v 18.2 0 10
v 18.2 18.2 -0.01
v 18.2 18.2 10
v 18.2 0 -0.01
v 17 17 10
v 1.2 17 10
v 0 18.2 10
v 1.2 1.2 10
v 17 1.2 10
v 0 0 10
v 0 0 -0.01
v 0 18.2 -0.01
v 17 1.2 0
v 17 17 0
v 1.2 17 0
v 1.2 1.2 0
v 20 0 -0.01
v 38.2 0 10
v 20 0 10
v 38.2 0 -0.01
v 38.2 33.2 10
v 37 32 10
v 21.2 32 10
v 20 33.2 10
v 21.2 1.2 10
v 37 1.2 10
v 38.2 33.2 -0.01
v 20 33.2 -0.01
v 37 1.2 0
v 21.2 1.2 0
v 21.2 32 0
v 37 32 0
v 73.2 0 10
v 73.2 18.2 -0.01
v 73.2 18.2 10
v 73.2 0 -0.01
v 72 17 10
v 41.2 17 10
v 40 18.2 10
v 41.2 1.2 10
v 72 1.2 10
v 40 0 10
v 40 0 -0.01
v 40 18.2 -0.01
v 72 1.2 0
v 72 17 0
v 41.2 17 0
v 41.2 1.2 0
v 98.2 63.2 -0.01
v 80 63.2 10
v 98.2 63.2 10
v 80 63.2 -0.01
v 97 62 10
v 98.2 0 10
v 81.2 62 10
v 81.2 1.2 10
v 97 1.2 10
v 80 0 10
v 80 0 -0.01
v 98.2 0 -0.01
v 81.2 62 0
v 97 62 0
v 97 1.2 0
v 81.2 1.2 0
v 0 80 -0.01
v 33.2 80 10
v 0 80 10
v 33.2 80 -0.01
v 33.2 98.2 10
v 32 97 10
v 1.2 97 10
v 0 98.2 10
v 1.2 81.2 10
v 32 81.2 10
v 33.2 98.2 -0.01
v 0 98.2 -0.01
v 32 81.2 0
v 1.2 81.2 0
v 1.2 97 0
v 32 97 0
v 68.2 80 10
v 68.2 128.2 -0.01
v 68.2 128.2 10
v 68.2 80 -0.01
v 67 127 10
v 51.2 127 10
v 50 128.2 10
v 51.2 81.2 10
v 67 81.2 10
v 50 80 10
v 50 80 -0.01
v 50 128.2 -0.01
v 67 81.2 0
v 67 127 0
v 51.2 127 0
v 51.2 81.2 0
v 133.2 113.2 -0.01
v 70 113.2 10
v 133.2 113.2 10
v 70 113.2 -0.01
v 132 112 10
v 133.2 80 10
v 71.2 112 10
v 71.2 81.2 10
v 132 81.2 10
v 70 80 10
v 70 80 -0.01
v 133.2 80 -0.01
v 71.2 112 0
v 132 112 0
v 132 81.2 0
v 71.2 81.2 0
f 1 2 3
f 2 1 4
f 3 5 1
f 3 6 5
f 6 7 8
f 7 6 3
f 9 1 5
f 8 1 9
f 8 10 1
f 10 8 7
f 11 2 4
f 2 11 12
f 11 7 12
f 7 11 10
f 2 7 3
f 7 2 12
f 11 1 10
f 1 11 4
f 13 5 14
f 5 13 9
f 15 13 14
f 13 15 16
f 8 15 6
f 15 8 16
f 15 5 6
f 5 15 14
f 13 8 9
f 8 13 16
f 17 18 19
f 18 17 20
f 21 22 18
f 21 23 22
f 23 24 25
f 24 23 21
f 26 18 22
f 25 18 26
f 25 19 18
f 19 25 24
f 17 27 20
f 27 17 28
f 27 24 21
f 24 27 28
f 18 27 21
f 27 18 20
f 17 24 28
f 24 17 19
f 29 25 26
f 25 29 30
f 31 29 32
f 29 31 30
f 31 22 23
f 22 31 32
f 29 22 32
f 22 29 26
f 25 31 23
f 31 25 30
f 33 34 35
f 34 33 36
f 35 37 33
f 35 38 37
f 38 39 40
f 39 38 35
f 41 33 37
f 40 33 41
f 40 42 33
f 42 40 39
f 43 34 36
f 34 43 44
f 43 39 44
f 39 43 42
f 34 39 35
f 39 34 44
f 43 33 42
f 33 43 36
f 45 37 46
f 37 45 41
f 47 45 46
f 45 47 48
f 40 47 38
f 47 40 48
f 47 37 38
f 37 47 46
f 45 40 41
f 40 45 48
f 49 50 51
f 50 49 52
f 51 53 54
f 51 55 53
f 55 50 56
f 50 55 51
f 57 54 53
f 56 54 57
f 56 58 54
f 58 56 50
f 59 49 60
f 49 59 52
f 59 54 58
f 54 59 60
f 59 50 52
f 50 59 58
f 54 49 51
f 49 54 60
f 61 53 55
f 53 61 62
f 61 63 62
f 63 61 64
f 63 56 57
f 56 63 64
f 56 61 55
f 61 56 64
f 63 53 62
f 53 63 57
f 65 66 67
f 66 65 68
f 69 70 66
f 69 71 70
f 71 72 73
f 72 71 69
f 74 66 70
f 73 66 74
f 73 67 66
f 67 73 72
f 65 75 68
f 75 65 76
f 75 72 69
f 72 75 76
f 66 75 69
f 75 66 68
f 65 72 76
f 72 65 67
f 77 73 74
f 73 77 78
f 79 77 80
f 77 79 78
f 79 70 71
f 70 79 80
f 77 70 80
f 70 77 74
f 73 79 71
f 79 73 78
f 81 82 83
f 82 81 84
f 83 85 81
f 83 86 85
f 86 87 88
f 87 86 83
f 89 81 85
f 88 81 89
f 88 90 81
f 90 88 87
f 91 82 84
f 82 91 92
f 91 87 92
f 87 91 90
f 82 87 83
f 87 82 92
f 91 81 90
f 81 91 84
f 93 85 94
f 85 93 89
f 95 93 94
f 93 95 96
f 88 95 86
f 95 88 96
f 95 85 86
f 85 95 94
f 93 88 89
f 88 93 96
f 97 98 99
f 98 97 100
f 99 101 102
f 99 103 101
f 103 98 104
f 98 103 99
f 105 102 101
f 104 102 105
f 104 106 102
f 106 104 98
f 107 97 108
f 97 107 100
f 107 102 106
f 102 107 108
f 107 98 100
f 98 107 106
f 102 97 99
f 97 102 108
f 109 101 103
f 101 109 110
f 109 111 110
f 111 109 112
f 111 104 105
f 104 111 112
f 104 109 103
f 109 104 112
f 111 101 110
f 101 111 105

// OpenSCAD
// file: ../../Base/Boxes.scad
// Fischertechnik Box Foundation
// Pre-designed Boxes

use <Constants.scad>

include <PlacementOptions.scad>

box190Width = 190;
box190Depth = 130;
box130Width = 130;
box130Depth = 95;
boxUsageHeight = 33.9;
boxWallThickness = 2.4;
boxBaseThickness = 1.0;

// getBoxWallThickness()
// Gets the wall thickness of a Fischertechnik Box

function getBoxWallThickness() = boxWallThickness;

// Gets the usable height of a fischertechnik box
function getBoxUsageHeight() = boxUsageHeight;

// Gets the thickness of the Fischertechnik box base.
function getBoxBaseThickness() = boxBaseThickness;

// Gets the usable inner space of a Box 190 as an x/y-list
function getBox190Space() = [
    box190Width - 2*getBoxWallThickness(), 
    box190Depth - 2*getBoxWallThickness() ];

// Imports the Fischertechnik empty box 130x190 mm and places it at position 0,0
// 190x130 are the outer sizes, the inner space is slightly smaller. Use getBox190Space() to get the inner sizes.
// This module needs the STL file "Fischertechnik Box 130x190.stl" in the library path.
// The box is positioned that the usable inner space is at the 0,0,0 position. The

module Box190() {
    translate([-getBoxWallThickness(),-getBoxWallThickness(),-getBoxBaseThickness()])
        import("Fischertechnik Box 130x190.stl", convexity=3);
}

// Gets the usable inner space of a Box 130 as an x/y-list
function getBox130Space() = [
    box130Width - 2*getBoxWallThickness(), 
    box130Depth - 2*getBoxWallThickness() ];

// Imports the Fischertechnik empty box 95x130 mm and places it at position 0,0
// 190x130 are the outer sizes, the inner space is slightly smaller. Use getBox190Space() to get the inner sizes.
// This module needs the STL file "Fischertechnik Box 95x130.stl" in the library path.
// The box is positioned that the usable inner space is at the 0,0,0 position. The

module Box130() {
    translate([-getBoxWallThickness(),-getBoxWallThickness(),-getBoxBaseThickness()])
        import("Fischertechnik Box 95x130.stl", convexity=3);
}

// Creates a web at the specified box walls
// corner 0 = LowerLeft, 1 = UpperLeft, 2 = UpperRight, 3 = LowerRight
// side 0 = LeftOfCorner, 1 = RightOfCorner
// distance = Distance in mm from the corner
// box = inner width and depth of the box (default: Box 190)
// webWidth = length of the web (default is 3 mms)
// webThickness = thickness of the web (default is 1 mm)

module BoxWeb(corner, side, distance, box=getBox190Space(), webWidth=3, webThickness=1.0) {
    sink = getBoxWallThickness()/2;

    width = (corner % 2 == 0) ? 
            (side == LeftOfCorner ? webWidth : webThickness) :
            (side == LeftOfCorner ? webThickness : webWidth);

    depth = (corner % 2 == 0) ? 
            (side == RightOfCorner ? webWidth : webThickness) :
            (side == RightOfCorner ? webThickness : webWidth);
    
    xDiff = corner == LowerLeft ? 
                (side == LeftOfCorner ? -sink : distance) :
            (corner == UpperLeft ?                
                (side == LeftOfCorner ? distance : -sink) :
            (corner == UpperRight ?
                (side == LeftOfCorner ? box.x-webWidth+sink : box.x-distance-webThickness) :
                (side == LeftOfCorner ? box.x-distance-webThickness: box.x-webWidth+sink)));

    yDiff = corner == LowerLeft ? 
                (side == RightOfCorner ? -sink : distance) :
            (corner == UpperLeft ?
                (side == RightOfCorner ? box.y-distance : box.y-webWidth+sink) :
            (corner == UpperRight ?
                (side == RightOfCorner ? box.y-webWidth+sink : box.y-distance) :
                (side == RightOfCorner ? distance : -sink)));
    
    translate([xDiff, yDiff, -getExcess()])
        cube([width, depth, boxUsageHeight + 2*getExcess()]);
}
// file: ../../Base/Rotation.scad
// Fischertechnik Box Foundation
// Geometry Helpers Rotation

include <PlacementOptions.scad>

// getRotatedSpace(space, rotation=NoRotation)
// Rotates the space dependent on the specified rotation

function getRotatedSpace(space, rotation=NoRotation) = [
    (rotation == Rotate90 || rotation == Rotate270) ? space.y : space.x,
    (rotation == Rotate90 || rotation == Rotate270) ? space.x : space.y
];

// Rotates the given space around the fixed left lower corner
// space = the space the children needs as width/depth list [width,depth]
// rotation = 0 Rotate0 degrees, 1 Rotate90 degrees, 2 Rotate180 degrees, 3 Rotate270 degrees (equivalent to -90)

module RotateFix(space, rotation=Rotate0) {
    dy = (rotation == Rotate0 || rotation == Rotate270) ? 0 :
        (rotation == Rotate90) ? space.x :
        space.y;
    dx = (rotation < Rotate180) ? 0 :
        (rotation == Rotate180) ? space.x :
        space.y;
    
    translate([dx, dy, 0])
        rotate([0, 0, rotations[rotation]])
            children();
}
// file: ../../Base/Alignment.scad
// Fischertechnik Box Foundation
// Geometry Helpers Alignment

include <PlacementOptions.scad>

// getAlignedX(elementWidth, spaceWidth, align=AlignRight, offset=0)
// Gets the aligned X offset of an element with the given
// width in the given space.
// elementWidth = The width of the element to positon
// spaceWidth = The space where the element should be aligned
// align = 0 AlignLeft, 1 AlignCenter, 2 AlignRight
// offset = an optional offset from the aligned position. When
// aligned left or centered, then positive values are in X direction.
// When aligned right then positive values are in negative X direction.

function getAlignedX(elementWidth, spaceWidth, align=AlignRight, offset=0) =
    (align == AlignLeft) ?
        offset :
        ((align == AlignCenter) ?
        (spaceWidth - elementWidth)/2 + offset :
        spaceWidth - offset - elementWidth);

// getAlignedY(elementDepth, spaceDepth, align=AlignTop, offset=0)
// Gets the aligned Y offset of an element with the given
// depth in the given space.
// elementDepth = The depth of the element to positon
// spaceDepth = The space where the element should be aligned
// align = 0 AlignBottom, 1 AlignCenter, 2 AlignTop
// offset = an optional offset from the aligned position. When
// aligned bottom or centered, then positive values are in Y direction.
// When aligned top then positive values are in negative Y direction.

function getAlignedY(elementDepth, spaceDepth, align=AlignTop, offset=0) =
    (align == AlignBottom) ?
        offset :
        ((align == AlignCenter) ?
        (spaceDepth - elementDepth)/2 + offset :
        spaceDepth - offset - elementDepth);
// file: ../../Base/Constants.scad
// Fischertechnik Box Foundation
// Constants

// Constant values necessary for multiple elements

// Base constants
dividerThickness = 1.2;
excess = 0.01;
fragments = 90;
tolerance = 0.8;

// Gets the thickness of a divider 
function getDividerThickness() = dividerThickness;

// Gets the excess that is used to merge walls into each other
function getExcess() = excess;

// Gets amount of fragments of a cylinder
function getFragments() = fragments;

// Gets the inner tolerance of a frame to each side
function getTolerance() = tolerance;


// Fischertechnik specific constants
axisDiameter = 4;
axisBottomDiameter = axisDiameter + 1;
standardEdgeDistance = 2.5;
standardWebDistance = 11.5;
standardCornerLength = 15;
tubeWallFactor = 1.6;

// Gets axis diameter
function getAxisDiameter() = axisDiameter;

// Gets axis bottom diameter for thicker part at the bottom
function getAxisBottomDiameter() = axisBottomDiameter;

// gets the standard distance to the wall of the box for dockable frames with webs
function getStandardEdgeDistance() = standardEdgeDistance;

// gets the standard distance of each web to the corner of the dockable frame
function getStandardWebDistance() = standardWebDistance;

// gets the standard length of the corner walls of a dockable frame
function getStandardCornerLength() = standardCornerLength;

// gets the wall thickness of a tube.
function getTubeWallThickness() = tubeWallFactor * getDividerThickness();
// file: ../../Base/PlacementOptions.scad
// Fischertechnik Box Foundation
// Placement Options

// Alignment
NoAlign = 0;
AlignLeft = 1;
AlignBottom = 2;
AlignCenter = 3;
AlignRight = 4;
AlignTop = 5;

// Element rotation degree steps
rotations = [0, -90, -180, -270];

// Rotation
NoRotation = 0;
Rotate0 = 0;
Rotate90 = 1;
Rotate180 = 2;
Rotate270 = 3;

// Docking (seen from above)
NoDock = -1;
DockLeft = 0;
DockTop = 1;
DockRight = 2;
DockCorner = 2;
DockBottom = 3;

// Web corners
LowerLeft = 0;
UpperLeft = 1;
UpperRight = 2;
LowerRight = 3;

// Web position relative to corner
LeftOfCorner = 0;
RightOfCorner = 1;
// file: ../../Elements/FrameStandardBlock.scad
// Fischertechnik Box Library
// Frame for standard blocks
// 31003, 31004, 31005 etc.

use <../ModelBase/Simple.scad>

width = 15;
depth = 15;
height = 10;

// getFrameSmallBlockSpace(columns=1, rows=1)
// Gets the space of a frame for columns x rows small parts (7.5 or 5)

function getFrameStandardBlockSpace(columns=1, rows=1) = getFrameOuterVolume([width * columns, depth * rows, height]);

// FrameSmallBlock(columns=1, rows=1)
// frame for columns x rows small parts (7.5 or 5)

module FrameStandardBlock(columns=1, rows=1) {
    Frame([width * columns, depth * rows, height]);
}

// Tests
color("lightgray")
FrameStandardBlock();
// file: ../../Base/Placement.scad
// Fischertechnik Box Foundation
// Geometry Helpers Placement

use <Constants.scad>
use <Alignment.scad>
use <Rotation.scad>
use <Boxes.scad>

include <PlacementOptions.scad>

// Place(x=0, y=0, elementSpace=[0,0], alignX=AlignLeft, alignY=AlignBottom, rotation=Rotate0, boxSpace=getBox190Space())
// Places the child at the specified position
// y = Y-Position. This is a relative position when an X aligment is specified.
// x = X-Position. This is a relative position when an Y aligment is specified.
// elementSpace = space of the element to be placed [x,y]
// alignX = -1=NoAlign, 0 AlignLeft, 1 AlignCenter, 3 AlignRight (elementSpace and boxSpace required!)
// alignY = -1=NoAlign, 2 AlignBottom, 1 AlignCenter, 4 AlignTop (elementSpace and boxSpace required!)
// rotation = 0 Rotate0 0 degrees, 1 Rotate90 90 degrees, 
// 2 Rotate180 180 degrees, 3 Rotate270 270 degrees (equivalent to -90)
// boxSpace = Inner space of the box where the placement occurs [x,y] - default is Box 190x130 inner space

module Place(x=0, y=0, elementSpace=[0,0], 
  alignX=AlignLeft, alignY=AlignBottom, 
  rotation=NoRotation, boxSpace=getBox190Space()) {

    module Position(x, y, space, rotation=Rotate0) {
        translate([x, y, 0])
            RotateFix(space, rotation)
                children(0);
    }

    space = getRotatedSpace(elementSpace, rotation);
    alignedX = getAlignedX(space.x, boxSpace.x, alignX, x);
    alignedY = getAlignedY(space.y, boxSpace.y, alignY, y);
    Position(alignedX, alignedY, elementSpace, rotation)
        children(0);
}

// Center(space=getBox130Space(), elementSpace=[0,0])
// space = Space where the children is centered. For cylinder use centered=true and no elementSpace.
// elementSpace = space of the element to be centered [x,y]

module Center(space=getBox190Space(), elementSpace=[0,0]) {
    translate([(space.x - elementSpace.x) / 2, (space.y - elementSpace.y) / 2])
        children(0);
}

// CenterHorizontal(width=0, y=0, offset=0, space=getBox130Space())
// space = Space where the children is centered. For cylinder use centered=true and no elementSpace.
// elementSpace = space of the element to be centered [x,y]

module CenterHorizontal(width=0, y=0, offset=0, space=getBox190Space()) {
    translate([(space.x - width) / 2 + offset, y])
        children(0);
}

// CenterVertical(depth=0, x=0, offset=0, space=getBox130Space())
// space = Space where the children is centered. For cylinder use centered=true and no elementSpace.
// elementSpace = space of the element to be centered [x,y]

module CenterVerticalal(depth=0, x=0, offset=0, space=getBox190Space()) {
    translate([x, (space.y - depth) / 2 + offset])
        children(0);
}
// main file
// Fischertechnik Box Foundation
// Elements
// Test FrameStandardBlock

use <../../Base/Placement.scad>
use <../../Elements/FrameStandardBlock.scad>

include <../../Base/PlacementOptions.scad>

FrameStandardBlock();

Place(20, 0, getFrameStandardBlockSpace(2), rotation=Rotate90)
    FrameStandardBlock(2);

Place(40, 0)
    FrameStandardBlock(2);

Place(80, 0, getFrameStandardBlockSpace(4), rotation=Rotate270)
    FrameStandardBlock(4);

Place(0, 80, getFrameStandardBlockSpace(rows=2), rotation=Rotate90)
    FrameStandardBlock(rows=2);

Place(50, 80)
    FrameStandardBlock(rows=3);

Place(70, 80, getFrameStandardBlockSpace(2,4), rotation=Rotate270)
    FrameStandardBlock(2,4);
